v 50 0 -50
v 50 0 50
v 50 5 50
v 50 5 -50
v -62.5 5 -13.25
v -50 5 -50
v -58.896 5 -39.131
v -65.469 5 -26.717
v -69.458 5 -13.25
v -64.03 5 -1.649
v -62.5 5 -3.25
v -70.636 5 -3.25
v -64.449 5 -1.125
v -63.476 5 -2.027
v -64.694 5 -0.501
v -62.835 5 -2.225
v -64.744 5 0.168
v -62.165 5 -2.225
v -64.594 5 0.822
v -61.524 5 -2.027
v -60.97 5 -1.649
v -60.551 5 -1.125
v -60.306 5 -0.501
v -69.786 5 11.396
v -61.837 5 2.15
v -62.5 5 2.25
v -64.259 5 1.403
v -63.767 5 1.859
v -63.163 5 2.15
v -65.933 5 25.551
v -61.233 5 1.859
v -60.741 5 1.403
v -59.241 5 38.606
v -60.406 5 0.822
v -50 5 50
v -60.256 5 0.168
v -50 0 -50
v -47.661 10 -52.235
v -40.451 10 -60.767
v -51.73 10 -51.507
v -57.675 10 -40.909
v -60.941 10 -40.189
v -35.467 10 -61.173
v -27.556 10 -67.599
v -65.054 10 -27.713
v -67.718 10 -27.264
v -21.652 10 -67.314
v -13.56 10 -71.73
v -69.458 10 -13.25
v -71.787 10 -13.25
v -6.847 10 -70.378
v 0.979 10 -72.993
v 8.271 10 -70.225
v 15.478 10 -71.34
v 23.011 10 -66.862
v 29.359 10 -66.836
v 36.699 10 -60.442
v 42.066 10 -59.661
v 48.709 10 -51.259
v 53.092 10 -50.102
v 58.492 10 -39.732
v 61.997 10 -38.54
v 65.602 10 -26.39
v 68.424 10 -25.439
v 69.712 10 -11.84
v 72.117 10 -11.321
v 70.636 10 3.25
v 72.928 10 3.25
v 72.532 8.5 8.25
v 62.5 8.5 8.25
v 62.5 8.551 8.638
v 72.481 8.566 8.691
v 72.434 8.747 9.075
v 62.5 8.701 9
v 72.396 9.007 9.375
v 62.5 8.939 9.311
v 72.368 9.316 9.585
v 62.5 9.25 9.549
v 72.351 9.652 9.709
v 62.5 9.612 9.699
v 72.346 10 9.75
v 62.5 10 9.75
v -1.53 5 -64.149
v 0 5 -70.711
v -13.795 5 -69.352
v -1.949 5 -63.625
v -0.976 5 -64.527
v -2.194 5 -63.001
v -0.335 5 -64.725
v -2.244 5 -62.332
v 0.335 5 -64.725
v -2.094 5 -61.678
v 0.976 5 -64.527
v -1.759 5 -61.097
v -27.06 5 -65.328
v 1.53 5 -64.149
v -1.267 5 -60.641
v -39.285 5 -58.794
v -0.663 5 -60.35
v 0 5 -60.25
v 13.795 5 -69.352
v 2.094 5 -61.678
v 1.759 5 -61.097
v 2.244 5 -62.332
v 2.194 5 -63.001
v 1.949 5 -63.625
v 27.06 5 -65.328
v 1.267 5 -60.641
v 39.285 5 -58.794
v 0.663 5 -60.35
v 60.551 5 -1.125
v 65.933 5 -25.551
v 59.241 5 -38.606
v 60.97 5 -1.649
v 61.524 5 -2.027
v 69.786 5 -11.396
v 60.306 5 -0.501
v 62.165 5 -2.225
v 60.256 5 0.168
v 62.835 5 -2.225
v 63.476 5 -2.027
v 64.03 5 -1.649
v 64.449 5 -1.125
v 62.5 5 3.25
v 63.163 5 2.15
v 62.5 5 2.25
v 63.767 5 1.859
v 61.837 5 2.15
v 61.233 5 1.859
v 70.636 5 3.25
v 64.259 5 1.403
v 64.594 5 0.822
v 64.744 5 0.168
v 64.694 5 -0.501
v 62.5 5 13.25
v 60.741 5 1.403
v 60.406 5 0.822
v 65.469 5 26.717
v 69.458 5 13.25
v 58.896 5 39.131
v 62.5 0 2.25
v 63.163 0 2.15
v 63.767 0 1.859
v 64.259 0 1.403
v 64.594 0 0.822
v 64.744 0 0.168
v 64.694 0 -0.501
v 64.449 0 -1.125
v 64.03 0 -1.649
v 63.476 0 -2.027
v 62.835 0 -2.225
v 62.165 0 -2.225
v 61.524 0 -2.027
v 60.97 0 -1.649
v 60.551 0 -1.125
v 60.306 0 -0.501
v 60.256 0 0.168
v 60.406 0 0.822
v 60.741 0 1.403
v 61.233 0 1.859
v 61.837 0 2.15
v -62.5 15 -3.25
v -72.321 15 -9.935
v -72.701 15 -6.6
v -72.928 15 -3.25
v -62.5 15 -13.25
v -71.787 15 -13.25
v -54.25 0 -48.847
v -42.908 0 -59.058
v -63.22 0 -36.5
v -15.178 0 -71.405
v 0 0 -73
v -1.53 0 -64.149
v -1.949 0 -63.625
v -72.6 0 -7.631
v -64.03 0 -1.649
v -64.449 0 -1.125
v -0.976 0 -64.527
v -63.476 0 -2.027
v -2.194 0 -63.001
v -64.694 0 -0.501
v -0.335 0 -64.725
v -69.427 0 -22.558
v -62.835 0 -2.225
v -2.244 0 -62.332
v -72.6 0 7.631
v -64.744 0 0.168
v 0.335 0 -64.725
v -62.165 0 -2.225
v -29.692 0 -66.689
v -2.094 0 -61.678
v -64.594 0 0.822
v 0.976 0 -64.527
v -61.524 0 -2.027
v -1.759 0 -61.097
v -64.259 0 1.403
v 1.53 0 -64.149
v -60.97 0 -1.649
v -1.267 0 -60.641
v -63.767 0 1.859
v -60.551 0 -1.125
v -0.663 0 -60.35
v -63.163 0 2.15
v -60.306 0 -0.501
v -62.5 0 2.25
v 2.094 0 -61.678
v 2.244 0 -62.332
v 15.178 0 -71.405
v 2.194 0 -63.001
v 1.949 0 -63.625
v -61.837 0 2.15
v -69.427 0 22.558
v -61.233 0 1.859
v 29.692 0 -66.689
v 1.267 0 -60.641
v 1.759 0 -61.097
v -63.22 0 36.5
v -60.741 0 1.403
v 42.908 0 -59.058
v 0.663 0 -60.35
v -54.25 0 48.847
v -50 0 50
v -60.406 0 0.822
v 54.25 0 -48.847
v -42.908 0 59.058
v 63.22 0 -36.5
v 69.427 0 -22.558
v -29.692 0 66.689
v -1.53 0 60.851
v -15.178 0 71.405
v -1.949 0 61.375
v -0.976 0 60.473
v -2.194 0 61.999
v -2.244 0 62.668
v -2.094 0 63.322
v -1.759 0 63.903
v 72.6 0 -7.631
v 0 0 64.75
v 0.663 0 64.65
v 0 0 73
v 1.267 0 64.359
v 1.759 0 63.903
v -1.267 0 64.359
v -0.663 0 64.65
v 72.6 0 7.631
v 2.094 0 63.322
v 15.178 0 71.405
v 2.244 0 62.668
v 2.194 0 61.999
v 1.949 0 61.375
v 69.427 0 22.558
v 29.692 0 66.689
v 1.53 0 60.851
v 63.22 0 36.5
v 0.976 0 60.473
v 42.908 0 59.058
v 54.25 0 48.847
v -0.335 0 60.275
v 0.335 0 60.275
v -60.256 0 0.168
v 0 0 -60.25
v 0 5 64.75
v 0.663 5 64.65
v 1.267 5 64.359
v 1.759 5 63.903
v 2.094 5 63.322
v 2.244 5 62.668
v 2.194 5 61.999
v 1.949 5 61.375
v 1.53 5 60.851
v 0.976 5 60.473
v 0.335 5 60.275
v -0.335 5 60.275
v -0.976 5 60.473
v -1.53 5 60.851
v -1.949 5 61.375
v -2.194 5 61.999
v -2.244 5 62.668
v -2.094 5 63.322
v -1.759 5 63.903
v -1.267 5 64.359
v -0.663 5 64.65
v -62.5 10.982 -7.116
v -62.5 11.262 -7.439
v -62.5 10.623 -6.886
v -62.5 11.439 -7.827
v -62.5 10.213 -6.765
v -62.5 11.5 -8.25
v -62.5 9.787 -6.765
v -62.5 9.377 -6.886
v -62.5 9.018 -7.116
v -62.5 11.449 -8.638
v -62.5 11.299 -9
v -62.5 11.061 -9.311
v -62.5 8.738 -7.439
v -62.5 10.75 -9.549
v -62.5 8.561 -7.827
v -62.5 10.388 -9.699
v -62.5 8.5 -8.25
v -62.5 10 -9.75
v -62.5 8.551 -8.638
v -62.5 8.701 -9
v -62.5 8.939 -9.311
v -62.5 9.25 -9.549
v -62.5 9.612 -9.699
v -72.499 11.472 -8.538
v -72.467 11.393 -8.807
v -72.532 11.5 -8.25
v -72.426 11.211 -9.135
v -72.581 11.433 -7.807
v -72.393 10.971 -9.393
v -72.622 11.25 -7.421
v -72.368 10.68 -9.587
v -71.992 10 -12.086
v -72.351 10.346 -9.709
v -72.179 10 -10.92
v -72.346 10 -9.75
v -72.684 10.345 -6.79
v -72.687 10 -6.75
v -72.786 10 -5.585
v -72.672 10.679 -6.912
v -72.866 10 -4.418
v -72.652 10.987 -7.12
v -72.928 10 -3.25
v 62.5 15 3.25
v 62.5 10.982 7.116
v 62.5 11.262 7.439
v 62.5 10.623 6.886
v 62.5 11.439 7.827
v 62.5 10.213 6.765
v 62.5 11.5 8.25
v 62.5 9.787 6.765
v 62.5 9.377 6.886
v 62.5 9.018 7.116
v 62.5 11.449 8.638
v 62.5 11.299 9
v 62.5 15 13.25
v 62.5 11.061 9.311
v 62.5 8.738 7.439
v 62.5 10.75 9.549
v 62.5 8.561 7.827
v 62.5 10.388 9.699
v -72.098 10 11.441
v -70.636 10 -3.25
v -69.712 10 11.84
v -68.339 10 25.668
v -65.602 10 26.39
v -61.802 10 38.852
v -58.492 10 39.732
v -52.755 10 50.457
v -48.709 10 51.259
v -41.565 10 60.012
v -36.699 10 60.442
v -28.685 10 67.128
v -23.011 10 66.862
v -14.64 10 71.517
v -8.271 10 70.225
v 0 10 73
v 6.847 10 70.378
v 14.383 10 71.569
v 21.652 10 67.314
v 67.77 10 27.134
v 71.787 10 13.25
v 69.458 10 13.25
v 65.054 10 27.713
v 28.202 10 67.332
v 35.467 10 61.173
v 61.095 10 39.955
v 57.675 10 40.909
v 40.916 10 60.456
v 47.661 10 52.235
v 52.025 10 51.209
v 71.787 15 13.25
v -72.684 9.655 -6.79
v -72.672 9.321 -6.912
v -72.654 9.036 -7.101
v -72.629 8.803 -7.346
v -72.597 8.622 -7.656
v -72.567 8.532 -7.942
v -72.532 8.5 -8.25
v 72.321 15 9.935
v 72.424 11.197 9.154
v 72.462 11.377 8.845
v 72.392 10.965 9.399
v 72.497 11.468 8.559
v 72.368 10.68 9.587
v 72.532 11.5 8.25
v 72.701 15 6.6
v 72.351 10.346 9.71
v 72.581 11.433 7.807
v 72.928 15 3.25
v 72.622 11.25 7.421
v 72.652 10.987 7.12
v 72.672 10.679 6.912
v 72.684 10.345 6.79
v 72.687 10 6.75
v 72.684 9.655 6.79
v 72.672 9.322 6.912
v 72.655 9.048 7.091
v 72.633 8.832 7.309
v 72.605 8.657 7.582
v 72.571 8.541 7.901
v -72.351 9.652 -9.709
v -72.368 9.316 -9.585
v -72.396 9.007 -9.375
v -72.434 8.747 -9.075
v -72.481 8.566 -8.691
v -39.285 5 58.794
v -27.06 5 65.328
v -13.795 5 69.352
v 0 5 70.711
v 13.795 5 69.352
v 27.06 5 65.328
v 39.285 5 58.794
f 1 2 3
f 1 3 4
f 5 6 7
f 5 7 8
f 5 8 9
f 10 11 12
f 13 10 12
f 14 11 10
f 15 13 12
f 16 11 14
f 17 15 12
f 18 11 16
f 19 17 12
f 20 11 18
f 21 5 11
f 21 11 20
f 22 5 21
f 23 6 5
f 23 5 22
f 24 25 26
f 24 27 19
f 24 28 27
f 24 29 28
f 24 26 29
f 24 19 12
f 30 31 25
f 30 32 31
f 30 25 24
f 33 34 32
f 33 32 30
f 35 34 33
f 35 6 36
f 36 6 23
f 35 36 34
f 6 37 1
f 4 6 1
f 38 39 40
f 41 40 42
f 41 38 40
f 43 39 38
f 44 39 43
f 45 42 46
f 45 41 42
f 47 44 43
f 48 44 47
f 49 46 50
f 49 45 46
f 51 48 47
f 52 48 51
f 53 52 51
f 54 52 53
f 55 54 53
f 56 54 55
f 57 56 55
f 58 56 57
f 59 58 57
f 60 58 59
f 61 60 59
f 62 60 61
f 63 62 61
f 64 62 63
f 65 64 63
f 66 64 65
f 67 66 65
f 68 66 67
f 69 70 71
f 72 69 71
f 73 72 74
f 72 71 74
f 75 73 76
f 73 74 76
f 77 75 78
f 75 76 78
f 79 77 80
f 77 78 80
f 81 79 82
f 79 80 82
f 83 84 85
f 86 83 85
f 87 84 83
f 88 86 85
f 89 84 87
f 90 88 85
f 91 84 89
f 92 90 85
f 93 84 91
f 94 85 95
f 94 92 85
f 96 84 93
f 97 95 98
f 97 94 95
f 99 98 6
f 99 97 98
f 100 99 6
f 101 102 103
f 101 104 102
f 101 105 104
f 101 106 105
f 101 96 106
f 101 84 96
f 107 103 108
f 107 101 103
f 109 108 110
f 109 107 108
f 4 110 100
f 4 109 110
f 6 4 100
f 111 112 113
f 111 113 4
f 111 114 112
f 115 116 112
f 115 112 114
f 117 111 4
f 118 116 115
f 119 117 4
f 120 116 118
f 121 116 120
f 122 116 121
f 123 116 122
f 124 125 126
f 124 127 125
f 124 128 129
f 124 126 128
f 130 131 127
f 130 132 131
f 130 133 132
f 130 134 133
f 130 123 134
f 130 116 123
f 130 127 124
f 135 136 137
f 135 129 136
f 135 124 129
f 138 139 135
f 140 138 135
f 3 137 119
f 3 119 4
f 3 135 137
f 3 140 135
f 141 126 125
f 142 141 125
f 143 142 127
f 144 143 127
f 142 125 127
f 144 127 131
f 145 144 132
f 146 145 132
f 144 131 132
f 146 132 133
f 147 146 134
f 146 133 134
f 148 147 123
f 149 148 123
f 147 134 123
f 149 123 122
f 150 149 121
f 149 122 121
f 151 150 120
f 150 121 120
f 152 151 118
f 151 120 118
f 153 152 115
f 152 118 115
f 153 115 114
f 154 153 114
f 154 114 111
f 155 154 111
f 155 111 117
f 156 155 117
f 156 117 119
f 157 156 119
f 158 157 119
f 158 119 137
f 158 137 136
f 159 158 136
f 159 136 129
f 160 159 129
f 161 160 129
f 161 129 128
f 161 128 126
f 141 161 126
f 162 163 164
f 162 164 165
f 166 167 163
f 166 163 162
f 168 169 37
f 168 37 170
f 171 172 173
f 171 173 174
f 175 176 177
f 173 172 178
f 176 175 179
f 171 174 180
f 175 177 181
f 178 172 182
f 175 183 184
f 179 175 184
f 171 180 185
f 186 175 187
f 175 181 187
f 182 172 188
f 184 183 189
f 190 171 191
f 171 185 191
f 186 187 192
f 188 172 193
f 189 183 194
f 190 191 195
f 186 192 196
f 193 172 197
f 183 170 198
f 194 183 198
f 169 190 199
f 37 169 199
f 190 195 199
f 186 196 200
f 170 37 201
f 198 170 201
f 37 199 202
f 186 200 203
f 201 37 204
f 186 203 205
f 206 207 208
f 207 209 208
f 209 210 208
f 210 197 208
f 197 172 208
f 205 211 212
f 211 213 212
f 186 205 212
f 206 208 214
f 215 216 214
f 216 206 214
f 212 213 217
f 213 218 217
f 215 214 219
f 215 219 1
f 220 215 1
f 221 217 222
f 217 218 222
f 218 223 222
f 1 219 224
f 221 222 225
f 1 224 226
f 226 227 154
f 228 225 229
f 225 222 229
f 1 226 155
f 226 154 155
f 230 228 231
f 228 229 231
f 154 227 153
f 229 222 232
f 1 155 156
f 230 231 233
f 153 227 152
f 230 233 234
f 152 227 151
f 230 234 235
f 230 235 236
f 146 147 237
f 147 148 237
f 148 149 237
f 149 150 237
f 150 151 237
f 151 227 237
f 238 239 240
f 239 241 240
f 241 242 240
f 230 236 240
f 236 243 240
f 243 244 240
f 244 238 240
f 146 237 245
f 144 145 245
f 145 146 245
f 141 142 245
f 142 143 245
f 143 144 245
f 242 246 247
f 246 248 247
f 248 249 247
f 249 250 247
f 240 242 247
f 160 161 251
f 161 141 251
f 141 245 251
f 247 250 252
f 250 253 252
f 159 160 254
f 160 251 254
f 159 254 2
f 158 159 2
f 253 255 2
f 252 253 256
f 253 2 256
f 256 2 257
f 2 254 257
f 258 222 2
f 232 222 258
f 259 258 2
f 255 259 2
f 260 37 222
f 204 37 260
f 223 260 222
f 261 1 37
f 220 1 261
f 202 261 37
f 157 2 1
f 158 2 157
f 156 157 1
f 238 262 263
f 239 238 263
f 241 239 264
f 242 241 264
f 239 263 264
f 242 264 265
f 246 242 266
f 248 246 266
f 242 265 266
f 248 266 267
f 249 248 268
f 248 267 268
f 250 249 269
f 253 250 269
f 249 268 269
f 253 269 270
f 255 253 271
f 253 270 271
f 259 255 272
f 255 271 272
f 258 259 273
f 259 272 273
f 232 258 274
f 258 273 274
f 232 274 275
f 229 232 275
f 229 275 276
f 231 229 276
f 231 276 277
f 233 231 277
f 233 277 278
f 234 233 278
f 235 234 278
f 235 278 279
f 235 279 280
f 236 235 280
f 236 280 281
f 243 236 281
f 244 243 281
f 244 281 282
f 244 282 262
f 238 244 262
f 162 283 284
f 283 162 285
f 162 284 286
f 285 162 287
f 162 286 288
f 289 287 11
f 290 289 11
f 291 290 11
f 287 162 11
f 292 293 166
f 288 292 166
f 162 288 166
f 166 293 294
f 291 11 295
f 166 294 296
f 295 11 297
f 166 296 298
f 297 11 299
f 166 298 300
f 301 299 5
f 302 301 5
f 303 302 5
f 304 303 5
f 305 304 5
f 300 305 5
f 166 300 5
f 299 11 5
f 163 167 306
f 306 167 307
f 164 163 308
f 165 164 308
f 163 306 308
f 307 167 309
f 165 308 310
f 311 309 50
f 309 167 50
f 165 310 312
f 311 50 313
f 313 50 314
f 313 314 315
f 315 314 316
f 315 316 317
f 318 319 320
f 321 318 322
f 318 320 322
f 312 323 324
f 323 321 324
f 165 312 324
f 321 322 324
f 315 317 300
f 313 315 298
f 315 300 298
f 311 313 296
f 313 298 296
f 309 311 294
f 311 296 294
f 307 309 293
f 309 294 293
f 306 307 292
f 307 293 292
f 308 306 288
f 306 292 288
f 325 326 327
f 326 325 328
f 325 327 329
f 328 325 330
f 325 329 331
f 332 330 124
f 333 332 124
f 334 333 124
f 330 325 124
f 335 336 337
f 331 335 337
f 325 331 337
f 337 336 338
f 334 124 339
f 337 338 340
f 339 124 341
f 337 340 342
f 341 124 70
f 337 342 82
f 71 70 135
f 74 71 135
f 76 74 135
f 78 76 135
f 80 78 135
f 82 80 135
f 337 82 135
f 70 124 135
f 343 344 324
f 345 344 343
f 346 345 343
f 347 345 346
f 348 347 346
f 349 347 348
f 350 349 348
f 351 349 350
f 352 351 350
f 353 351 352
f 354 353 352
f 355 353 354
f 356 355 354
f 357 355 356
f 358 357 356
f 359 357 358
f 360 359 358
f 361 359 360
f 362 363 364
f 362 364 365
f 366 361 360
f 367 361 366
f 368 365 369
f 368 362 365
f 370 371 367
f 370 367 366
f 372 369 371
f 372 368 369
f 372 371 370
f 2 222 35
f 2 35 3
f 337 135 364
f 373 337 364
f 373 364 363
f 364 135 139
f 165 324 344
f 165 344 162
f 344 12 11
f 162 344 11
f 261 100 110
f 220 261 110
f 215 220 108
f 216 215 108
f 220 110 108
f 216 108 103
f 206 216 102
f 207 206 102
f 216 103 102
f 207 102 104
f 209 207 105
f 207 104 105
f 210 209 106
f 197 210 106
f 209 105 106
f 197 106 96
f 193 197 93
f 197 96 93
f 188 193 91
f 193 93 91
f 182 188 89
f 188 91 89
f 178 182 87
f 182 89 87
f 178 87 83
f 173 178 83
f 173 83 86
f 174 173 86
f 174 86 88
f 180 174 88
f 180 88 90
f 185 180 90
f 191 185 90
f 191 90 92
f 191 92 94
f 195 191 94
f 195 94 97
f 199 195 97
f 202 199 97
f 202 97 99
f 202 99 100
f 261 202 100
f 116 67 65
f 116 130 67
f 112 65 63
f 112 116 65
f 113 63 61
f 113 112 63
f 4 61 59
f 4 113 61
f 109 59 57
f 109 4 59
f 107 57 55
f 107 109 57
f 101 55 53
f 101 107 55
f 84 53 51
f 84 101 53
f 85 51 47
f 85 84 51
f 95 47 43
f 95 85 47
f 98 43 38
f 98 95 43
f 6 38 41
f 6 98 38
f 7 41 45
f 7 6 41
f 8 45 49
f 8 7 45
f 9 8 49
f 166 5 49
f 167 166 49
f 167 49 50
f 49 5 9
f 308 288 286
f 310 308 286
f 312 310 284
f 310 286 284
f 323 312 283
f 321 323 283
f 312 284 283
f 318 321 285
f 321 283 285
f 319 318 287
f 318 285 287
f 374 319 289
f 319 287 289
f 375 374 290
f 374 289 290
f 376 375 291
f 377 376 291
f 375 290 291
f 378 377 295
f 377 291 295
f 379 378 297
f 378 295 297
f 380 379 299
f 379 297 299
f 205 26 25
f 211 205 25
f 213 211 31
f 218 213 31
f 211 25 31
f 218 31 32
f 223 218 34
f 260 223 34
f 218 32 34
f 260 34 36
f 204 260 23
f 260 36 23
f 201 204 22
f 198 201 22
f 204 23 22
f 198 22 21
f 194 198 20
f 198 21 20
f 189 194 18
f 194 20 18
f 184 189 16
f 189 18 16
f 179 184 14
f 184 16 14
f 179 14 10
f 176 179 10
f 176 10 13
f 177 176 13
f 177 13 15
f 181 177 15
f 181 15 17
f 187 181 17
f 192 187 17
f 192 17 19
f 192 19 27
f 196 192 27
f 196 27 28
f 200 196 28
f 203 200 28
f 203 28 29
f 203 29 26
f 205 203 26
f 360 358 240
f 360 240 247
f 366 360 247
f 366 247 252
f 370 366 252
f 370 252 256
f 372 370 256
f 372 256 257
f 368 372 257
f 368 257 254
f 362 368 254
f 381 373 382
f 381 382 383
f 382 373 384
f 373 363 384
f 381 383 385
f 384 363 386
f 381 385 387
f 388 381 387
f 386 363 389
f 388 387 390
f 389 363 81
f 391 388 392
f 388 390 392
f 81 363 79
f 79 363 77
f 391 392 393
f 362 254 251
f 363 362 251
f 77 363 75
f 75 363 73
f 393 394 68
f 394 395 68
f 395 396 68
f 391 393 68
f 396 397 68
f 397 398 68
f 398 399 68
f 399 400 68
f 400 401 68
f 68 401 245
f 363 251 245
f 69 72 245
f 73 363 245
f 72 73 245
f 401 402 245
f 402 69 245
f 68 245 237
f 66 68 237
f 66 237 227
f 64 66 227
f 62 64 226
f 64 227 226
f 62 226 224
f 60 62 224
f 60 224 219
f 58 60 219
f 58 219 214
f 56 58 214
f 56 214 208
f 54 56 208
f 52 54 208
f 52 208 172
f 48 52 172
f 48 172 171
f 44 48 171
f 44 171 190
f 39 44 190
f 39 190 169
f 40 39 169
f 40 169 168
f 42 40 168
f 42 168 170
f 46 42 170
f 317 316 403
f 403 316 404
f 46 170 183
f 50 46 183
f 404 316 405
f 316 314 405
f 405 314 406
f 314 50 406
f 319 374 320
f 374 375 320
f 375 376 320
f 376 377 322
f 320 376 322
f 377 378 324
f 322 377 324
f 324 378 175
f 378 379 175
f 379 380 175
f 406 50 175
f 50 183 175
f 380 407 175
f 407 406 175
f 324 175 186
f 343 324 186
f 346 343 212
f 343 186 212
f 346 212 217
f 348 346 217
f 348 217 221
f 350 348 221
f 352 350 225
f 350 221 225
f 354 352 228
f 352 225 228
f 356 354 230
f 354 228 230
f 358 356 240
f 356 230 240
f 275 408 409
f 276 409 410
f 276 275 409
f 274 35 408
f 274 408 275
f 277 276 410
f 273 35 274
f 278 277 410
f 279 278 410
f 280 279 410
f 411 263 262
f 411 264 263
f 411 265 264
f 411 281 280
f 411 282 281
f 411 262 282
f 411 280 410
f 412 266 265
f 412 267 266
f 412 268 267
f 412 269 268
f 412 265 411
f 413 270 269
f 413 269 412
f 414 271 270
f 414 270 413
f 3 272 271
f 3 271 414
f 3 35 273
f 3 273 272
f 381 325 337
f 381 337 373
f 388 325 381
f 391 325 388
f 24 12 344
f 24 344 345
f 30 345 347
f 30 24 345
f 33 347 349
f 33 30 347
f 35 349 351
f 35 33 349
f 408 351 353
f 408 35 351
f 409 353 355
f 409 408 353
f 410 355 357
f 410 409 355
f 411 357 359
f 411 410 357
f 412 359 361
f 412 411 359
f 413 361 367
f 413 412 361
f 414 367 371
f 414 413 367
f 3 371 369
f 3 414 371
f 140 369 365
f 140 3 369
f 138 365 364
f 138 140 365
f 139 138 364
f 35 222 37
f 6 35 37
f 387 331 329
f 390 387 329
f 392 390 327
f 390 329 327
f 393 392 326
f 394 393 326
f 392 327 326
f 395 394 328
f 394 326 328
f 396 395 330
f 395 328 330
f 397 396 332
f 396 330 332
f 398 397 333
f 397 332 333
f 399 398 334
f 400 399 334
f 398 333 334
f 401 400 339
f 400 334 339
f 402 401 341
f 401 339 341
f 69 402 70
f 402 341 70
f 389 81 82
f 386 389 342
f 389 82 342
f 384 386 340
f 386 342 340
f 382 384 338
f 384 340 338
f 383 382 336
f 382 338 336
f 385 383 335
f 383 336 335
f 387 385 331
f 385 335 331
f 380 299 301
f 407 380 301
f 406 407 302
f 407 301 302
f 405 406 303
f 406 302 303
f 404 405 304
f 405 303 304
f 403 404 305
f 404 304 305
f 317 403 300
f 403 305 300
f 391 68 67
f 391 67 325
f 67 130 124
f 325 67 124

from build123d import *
from build123d.topology import SkipClean

# Parameters (mm, degrees)
SKETCH1_R           = 76
SKETCH1_W           = 100
SKETCH1_H           = 100
BOSS_EXTRUDE1_DEPTH = 5
SKETCH2_R           = 2.25
CUT_EXTRUDE1_DEPTH  = 10
SKETCH3_R           = 73
SKETCH3_R_2         = 70.710678119
BOSS_EXTRUDE2_DEPTH = 5
CUT_EXTRUDE2_START  = -5
SKETCH4_R           = 76
SKETCH4_R_2         = 73
CUT_EXTRUDE2_DEPTH  = 5
BOSS_EXTRUDE4_DEPTH = 10
CUT_EXTRUDE3_DEPTH  = 23
CUT_EXTRUDE4_DEPTH  = 21


with BuildPart() as part:
    # Sketch1 → Boss-Extrude1 (new body)
    with BuildSketch(Plane(origin=(0, 0, 0), x_dir=(1, 0, 0), z_dir=(0, 1, 0))):
        with Locations(Location((0, 0, 0), (0, 0, 270))):
            Circle(SKETCH1_R)
        Rectangle(SKETCH1_W, SKETCH1_H, mode=Mode.SUBTRACT)
    extrude(amount=BOSS_EXTRUDE1_DEPTH)

    # Sketch2 → Cut-Extrude1 (cut)
    with BuildSketch(Plane(origin=(0, 5, 0), x_dir=(1, 0, 0), z_dir=(0, 1, 0))):
        with Locations(Location((-62.5, 0, 0), (0, 0, 270))):
            Circle(SKETCH2_R)
        with Locations(Location((0, 62.5, 0), (0, 0, 270))):
            Circle(SKETCH2_R)
        with Locations(Location((62.5, 0, 0), (0, 0, 270))):
            Circle(SKETCH2_R)
        with Locations(Location((0, -62.5, 0), (0, 0, 270))):
            Circle(SKETCH2_R)
    extrude(amount=-CUT_EXTRUDE1_DEPTH, mode=Mode.SUBTRACT)

    # Sketch3 → Boss-Extrude2 (add)
    with BuildSketch(Plane(origin=(0, 5, 0), x_dir=(1, 0, 0), z_dir=(0, 1, 0))):
        with Locations(Location((0, 0, 0), (0, 0, 270))):
            Circle(SKETCH3_R)
        with Locations(Location((0, 0, 0), (0, 0, 135))):
            Circle(SKETCH3_R_2, mode=Mode.SUBTRACT)
    extrude(amount=BOSS_EXTRUDE2_DEPTH)

    # Sketch4 → Cut-Extrude2 (cut)
    with BuildSketch(Plane(origin=(0, 5, 0), x_dir=(1, 0, 0), z_dir=(0, 1, 0)).offset(CUT_EXTRUDE2_START)):
        Circle(SKETCH4_R)
        with Locations(Location((0, 0, 0), (0, 0, 270))):
            Circle(SKETCH4_R_2, mode=Mode.SUBTRACT)
    extrude(amount=CUT_EXTRUDE2_DEPTH, mode=Mode.SUBTRACT)

    # Sketch7 → Boss-Extrude4 (add)
    with SkipClean():  # the faces are left unmerged after this step: merging them gives an invalid solid
        with BuildSketch(Plane(origin=(0, 5, 0), x_dir=(1, 0, 0), z_dir=(0, 1, 0))):
            with BuildLine():
                ThreePointArc((-71.787446674, 13.25), (-72.530079982, 8.269673379), (-72.927618225, 3.25))
                Line((-72.927618225, 3.25), (-62.5, 3.25))
                Line((-62.5, 3.25), (-62.5, 13.25))
                Line((-62.5, 13.25), (-71.787446674, 13.25))
            make_face()
            with BuildLine():
                Line((72.927618225, -3.25), (62.5, -3.25))
                Line((62.5, -3.25), (62.5, -13.25))
                Line((62.5, -13.25), (71.787446674, -13.25))
                ThreePointArc((71.787446674, -13.25), (72.530079982, -8.269673379), (72.927618225, -3.25))
            make_face()
        extrude(amount=BOSS_EXTRUDE4_DEPTH)

    # Sketch8 → Cut-Extrude3 (cut)
    with SkipClean():  # the faces are left unmerged after this step: merging them gives an invalid solid
        with BuildSketch(Plane.ZY.offset(-62.5)):
            with BuildLine():
                ThreePointArc((9.75, 10), (9.310660172, 11.060660172), (8.25, 11.5))
                Line((8.25, 11.5), (8.25, 8.5))
                ThreePointArc((8.25, 8.5), (9.310660172, 8.939339828), (9.75, 10))
            make_face()
            with BuildLine():
                Line((8.25, 8.5), (8.25, 11.5))
                ThreePointArc((8.25, 11.5), (6.75, 10), (8.25, 8.5))
            make_face()
        extrude(amount=-CUT_EXTRUDE3_DEPTH, mode=Mode.SUBTRACT)

    # Sketch9 → Cut-Extrude4 (cut)
    with BuildSketch(Plane(origin=(-62.5, 0, 0), x_dir=(0, 0, -1), z_dir=(1, 0, 0))):
        with BuildLine():
            ThreePointArc((9.75, 10), (9.310660172, 11.060660172), (8.25, 11.5))
            Line((8.25, 11.5), (8.25, 8.5))
            ThreePointArc((8.25, 8.5), (9.310660172, 8.939339828), (9.75, 10))
        make_face()
        with BuildLine():
            Line((8.25, 8.5), (8.25, 11.5))
            ThreePointArc((8.25, 11.5), (6.75, 10), (8.25, 8.5))
        make_face()
    extrude(amount=-CUT_EXTRUDE4_DEPTH, mode=Mode.SUBTRACT)


solid = part.part
